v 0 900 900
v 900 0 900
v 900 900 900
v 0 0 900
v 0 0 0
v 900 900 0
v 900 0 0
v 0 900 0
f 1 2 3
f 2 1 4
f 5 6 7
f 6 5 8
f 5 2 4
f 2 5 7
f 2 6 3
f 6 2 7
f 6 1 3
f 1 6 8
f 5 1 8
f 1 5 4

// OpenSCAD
// cube_param.scad
// param: size=10
module param_cube(size=10) {
    cube(size=900);
}
param_cube(size=10);
